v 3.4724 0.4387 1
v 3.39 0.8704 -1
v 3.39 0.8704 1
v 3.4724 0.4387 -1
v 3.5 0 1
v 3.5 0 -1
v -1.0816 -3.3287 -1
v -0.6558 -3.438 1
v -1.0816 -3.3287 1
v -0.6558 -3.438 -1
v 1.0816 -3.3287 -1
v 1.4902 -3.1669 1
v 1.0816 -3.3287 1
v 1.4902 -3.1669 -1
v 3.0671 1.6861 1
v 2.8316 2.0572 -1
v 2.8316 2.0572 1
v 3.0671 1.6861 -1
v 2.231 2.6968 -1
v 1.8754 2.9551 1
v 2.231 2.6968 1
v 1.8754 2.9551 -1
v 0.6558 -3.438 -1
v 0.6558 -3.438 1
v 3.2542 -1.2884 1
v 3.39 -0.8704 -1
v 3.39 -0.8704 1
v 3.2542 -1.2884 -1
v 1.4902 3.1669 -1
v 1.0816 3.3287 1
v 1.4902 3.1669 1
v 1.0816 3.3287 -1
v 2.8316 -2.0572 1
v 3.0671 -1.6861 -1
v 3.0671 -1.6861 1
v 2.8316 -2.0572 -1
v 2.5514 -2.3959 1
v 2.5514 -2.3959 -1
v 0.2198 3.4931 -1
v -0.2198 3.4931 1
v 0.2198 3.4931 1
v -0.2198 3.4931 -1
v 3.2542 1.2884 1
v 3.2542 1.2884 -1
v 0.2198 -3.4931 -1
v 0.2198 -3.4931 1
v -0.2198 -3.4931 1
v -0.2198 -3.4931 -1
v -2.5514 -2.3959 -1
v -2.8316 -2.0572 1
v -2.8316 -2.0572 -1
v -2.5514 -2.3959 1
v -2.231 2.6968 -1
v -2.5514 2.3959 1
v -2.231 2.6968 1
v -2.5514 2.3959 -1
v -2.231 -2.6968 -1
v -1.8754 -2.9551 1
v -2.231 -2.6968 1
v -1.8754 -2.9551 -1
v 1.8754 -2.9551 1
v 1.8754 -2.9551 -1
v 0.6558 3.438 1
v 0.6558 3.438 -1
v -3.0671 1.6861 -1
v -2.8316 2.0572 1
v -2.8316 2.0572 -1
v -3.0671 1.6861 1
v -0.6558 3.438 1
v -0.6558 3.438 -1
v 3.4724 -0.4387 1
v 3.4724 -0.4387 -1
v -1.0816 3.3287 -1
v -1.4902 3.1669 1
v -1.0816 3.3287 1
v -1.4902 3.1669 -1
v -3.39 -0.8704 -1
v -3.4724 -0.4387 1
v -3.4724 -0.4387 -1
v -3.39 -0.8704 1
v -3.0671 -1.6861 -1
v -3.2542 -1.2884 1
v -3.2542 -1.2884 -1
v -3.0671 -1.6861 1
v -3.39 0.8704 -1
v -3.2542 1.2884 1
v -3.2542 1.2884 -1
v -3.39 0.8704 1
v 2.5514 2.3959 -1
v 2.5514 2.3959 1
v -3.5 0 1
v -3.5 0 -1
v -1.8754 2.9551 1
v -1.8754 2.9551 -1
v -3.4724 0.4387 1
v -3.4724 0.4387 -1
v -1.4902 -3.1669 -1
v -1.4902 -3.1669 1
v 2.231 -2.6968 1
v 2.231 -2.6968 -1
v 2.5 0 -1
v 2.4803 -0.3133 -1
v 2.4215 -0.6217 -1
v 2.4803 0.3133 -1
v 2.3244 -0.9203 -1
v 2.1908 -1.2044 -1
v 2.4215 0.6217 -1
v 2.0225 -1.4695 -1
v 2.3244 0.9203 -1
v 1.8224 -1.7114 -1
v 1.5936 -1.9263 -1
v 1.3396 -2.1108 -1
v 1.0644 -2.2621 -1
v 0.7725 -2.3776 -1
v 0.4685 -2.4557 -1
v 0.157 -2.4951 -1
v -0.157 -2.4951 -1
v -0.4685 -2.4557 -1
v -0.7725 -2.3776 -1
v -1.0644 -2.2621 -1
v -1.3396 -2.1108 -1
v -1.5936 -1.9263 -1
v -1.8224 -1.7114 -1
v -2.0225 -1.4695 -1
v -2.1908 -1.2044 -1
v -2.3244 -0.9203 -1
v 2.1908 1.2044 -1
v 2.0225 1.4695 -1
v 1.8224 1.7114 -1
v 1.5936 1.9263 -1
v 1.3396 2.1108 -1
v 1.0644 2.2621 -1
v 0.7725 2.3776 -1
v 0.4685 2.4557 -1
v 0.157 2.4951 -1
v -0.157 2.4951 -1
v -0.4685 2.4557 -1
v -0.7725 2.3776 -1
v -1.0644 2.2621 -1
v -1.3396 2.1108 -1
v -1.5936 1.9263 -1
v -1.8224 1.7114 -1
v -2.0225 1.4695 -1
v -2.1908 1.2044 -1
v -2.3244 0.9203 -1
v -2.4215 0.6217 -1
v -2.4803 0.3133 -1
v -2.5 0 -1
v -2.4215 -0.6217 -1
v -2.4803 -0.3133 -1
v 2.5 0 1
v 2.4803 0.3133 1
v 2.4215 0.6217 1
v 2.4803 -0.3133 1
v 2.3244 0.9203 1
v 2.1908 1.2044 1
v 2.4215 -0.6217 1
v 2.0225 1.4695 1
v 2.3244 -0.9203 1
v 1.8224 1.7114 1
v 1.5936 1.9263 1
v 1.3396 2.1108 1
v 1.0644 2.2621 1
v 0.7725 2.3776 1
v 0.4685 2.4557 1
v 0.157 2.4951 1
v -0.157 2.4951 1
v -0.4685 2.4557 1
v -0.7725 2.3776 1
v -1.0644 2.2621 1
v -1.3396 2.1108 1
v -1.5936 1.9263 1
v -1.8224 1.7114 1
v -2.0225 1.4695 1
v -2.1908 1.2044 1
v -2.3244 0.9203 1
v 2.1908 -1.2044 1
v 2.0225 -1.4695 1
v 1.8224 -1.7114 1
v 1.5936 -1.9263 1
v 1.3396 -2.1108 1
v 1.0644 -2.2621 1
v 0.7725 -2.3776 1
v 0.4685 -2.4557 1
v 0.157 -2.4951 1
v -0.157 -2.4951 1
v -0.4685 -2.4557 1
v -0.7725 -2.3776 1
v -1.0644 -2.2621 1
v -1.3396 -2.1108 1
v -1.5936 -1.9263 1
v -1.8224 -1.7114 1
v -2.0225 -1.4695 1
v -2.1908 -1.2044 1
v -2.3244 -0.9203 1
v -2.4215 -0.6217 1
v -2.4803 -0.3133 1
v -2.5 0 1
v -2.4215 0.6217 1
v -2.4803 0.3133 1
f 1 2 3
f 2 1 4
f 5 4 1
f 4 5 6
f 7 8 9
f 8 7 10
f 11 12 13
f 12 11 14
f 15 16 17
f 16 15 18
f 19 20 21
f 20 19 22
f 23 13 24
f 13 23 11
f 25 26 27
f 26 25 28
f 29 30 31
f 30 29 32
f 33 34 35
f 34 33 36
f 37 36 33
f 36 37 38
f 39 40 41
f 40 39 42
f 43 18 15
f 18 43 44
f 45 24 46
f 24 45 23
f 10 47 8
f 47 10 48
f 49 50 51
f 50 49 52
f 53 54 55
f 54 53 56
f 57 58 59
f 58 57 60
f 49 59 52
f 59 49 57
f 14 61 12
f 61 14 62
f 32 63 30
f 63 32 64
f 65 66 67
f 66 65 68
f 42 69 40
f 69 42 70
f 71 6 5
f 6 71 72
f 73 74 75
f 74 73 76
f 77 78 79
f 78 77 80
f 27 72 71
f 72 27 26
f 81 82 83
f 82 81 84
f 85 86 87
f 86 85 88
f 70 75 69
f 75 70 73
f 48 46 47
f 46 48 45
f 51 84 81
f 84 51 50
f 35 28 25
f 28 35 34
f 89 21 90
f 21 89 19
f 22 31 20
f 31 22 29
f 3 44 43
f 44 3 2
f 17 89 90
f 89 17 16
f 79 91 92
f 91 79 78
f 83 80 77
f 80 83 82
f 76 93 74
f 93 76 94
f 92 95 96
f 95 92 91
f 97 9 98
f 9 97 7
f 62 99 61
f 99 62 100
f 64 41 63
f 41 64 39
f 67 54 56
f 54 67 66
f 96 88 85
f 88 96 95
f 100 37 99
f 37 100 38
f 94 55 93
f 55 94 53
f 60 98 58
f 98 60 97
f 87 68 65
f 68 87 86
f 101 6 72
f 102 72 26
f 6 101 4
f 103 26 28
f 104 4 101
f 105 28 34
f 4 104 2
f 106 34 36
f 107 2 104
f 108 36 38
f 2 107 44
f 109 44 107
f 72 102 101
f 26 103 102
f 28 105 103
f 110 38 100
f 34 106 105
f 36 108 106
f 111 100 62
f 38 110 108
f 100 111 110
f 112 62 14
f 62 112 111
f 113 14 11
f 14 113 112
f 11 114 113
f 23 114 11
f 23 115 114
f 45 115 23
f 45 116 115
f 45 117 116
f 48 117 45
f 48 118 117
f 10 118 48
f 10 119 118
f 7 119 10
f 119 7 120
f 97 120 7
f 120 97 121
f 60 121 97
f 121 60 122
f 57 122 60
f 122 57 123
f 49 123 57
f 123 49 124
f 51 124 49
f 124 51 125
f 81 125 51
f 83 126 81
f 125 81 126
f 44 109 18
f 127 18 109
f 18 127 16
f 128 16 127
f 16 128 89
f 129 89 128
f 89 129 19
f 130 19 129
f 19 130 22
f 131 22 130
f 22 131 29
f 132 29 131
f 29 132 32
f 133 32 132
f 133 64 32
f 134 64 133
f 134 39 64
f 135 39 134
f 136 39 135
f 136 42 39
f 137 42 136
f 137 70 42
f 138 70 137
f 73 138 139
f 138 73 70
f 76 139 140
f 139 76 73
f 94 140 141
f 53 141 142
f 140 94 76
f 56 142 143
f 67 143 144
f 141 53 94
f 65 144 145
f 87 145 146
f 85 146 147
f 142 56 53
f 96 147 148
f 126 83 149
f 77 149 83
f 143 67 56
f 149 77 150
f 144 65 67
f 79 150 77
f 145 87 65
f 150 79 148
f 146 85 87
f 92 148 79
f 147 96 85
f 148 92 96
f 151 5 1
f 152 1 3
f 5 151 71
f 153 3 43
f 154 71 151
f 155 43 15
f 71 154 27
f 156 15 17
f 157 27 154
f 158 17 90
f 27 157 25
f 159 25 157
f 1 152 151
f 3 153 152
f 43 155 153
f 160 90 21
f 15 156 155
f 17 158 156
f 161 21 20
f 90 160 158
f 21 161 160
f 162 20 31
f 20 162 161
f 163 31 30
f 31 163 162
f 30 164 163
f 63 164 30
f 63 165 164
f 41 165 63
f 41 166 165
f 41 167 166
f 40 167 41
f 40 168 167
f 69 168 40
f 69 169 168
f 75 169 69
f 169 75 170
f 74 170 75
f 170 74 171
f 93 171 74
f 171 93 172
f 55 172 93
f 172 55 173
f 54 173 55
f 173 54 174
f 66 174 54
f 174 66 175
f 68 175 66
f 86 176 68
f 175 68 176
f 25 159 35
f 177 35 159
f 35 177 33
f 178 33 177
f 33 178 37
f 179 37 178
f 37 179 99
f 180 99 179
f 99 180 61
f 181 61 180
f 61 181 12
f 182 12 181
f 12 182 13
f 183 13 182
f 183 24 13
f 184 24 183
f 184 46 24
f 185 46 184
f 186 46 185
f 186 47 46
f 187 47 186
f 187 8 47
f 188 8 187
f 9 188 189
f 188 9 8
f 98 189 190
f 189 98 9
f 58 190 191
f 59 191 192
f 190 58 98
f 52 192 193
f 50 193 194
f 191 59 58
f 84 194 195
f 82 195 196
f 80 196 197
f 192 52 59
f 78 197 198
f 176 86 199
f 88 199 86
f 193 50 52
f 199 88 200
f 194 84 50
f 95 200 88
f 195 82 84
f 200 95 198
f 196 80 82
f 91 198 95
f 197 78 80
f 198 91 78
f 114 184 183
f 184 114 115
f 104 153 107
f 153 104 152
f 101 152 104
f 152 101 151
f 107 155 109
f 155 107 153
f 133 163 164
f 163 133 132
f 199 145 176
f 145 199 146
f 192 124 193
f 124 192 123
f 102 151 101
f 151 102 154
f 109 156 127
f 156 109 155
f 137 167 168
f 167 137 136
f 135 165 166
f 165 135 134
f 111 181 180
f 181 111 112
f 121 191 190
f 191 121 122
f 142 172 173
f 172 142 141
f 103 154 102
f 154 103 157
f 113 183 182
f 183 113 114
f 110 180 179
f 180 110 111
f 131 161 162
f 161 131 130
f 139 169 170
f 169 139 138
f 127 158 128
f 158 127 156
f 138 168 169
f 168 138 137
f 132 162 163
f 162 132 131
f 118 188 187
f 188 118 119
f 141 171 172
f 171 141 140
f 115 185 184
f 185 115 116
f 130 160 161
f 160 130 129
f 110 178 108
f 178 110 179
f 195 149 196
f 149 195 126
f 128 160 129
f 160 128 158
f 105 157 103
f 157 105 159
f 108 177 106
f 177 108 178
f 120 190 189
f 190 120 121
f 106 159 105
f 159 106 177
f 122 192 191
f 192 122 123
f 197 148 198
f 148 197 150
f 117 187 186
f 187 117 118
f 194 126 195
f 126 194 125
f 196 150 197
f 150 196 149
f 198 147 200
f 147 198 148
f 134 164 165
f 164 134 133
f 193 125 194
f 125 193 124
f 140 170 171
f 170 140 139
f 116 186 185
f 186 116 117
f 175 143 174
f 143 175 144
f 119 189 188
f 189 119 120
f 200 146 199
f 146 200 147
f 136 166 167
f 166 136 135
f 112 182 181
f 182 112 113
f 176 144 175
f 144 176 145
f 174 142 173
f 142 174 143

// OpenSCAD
$fn = 50;


difference() {
	union() {
		translate(v = [0, 0, -1.0000000000]) {
			cylinder(h = 2, r = 3.5000000000);
		}
	}
	union() {
		translate(v = [0, 0, -100.0000000000]) {
			cylinder(h = 200, r = 2.5000000000);
		}
	}
}
